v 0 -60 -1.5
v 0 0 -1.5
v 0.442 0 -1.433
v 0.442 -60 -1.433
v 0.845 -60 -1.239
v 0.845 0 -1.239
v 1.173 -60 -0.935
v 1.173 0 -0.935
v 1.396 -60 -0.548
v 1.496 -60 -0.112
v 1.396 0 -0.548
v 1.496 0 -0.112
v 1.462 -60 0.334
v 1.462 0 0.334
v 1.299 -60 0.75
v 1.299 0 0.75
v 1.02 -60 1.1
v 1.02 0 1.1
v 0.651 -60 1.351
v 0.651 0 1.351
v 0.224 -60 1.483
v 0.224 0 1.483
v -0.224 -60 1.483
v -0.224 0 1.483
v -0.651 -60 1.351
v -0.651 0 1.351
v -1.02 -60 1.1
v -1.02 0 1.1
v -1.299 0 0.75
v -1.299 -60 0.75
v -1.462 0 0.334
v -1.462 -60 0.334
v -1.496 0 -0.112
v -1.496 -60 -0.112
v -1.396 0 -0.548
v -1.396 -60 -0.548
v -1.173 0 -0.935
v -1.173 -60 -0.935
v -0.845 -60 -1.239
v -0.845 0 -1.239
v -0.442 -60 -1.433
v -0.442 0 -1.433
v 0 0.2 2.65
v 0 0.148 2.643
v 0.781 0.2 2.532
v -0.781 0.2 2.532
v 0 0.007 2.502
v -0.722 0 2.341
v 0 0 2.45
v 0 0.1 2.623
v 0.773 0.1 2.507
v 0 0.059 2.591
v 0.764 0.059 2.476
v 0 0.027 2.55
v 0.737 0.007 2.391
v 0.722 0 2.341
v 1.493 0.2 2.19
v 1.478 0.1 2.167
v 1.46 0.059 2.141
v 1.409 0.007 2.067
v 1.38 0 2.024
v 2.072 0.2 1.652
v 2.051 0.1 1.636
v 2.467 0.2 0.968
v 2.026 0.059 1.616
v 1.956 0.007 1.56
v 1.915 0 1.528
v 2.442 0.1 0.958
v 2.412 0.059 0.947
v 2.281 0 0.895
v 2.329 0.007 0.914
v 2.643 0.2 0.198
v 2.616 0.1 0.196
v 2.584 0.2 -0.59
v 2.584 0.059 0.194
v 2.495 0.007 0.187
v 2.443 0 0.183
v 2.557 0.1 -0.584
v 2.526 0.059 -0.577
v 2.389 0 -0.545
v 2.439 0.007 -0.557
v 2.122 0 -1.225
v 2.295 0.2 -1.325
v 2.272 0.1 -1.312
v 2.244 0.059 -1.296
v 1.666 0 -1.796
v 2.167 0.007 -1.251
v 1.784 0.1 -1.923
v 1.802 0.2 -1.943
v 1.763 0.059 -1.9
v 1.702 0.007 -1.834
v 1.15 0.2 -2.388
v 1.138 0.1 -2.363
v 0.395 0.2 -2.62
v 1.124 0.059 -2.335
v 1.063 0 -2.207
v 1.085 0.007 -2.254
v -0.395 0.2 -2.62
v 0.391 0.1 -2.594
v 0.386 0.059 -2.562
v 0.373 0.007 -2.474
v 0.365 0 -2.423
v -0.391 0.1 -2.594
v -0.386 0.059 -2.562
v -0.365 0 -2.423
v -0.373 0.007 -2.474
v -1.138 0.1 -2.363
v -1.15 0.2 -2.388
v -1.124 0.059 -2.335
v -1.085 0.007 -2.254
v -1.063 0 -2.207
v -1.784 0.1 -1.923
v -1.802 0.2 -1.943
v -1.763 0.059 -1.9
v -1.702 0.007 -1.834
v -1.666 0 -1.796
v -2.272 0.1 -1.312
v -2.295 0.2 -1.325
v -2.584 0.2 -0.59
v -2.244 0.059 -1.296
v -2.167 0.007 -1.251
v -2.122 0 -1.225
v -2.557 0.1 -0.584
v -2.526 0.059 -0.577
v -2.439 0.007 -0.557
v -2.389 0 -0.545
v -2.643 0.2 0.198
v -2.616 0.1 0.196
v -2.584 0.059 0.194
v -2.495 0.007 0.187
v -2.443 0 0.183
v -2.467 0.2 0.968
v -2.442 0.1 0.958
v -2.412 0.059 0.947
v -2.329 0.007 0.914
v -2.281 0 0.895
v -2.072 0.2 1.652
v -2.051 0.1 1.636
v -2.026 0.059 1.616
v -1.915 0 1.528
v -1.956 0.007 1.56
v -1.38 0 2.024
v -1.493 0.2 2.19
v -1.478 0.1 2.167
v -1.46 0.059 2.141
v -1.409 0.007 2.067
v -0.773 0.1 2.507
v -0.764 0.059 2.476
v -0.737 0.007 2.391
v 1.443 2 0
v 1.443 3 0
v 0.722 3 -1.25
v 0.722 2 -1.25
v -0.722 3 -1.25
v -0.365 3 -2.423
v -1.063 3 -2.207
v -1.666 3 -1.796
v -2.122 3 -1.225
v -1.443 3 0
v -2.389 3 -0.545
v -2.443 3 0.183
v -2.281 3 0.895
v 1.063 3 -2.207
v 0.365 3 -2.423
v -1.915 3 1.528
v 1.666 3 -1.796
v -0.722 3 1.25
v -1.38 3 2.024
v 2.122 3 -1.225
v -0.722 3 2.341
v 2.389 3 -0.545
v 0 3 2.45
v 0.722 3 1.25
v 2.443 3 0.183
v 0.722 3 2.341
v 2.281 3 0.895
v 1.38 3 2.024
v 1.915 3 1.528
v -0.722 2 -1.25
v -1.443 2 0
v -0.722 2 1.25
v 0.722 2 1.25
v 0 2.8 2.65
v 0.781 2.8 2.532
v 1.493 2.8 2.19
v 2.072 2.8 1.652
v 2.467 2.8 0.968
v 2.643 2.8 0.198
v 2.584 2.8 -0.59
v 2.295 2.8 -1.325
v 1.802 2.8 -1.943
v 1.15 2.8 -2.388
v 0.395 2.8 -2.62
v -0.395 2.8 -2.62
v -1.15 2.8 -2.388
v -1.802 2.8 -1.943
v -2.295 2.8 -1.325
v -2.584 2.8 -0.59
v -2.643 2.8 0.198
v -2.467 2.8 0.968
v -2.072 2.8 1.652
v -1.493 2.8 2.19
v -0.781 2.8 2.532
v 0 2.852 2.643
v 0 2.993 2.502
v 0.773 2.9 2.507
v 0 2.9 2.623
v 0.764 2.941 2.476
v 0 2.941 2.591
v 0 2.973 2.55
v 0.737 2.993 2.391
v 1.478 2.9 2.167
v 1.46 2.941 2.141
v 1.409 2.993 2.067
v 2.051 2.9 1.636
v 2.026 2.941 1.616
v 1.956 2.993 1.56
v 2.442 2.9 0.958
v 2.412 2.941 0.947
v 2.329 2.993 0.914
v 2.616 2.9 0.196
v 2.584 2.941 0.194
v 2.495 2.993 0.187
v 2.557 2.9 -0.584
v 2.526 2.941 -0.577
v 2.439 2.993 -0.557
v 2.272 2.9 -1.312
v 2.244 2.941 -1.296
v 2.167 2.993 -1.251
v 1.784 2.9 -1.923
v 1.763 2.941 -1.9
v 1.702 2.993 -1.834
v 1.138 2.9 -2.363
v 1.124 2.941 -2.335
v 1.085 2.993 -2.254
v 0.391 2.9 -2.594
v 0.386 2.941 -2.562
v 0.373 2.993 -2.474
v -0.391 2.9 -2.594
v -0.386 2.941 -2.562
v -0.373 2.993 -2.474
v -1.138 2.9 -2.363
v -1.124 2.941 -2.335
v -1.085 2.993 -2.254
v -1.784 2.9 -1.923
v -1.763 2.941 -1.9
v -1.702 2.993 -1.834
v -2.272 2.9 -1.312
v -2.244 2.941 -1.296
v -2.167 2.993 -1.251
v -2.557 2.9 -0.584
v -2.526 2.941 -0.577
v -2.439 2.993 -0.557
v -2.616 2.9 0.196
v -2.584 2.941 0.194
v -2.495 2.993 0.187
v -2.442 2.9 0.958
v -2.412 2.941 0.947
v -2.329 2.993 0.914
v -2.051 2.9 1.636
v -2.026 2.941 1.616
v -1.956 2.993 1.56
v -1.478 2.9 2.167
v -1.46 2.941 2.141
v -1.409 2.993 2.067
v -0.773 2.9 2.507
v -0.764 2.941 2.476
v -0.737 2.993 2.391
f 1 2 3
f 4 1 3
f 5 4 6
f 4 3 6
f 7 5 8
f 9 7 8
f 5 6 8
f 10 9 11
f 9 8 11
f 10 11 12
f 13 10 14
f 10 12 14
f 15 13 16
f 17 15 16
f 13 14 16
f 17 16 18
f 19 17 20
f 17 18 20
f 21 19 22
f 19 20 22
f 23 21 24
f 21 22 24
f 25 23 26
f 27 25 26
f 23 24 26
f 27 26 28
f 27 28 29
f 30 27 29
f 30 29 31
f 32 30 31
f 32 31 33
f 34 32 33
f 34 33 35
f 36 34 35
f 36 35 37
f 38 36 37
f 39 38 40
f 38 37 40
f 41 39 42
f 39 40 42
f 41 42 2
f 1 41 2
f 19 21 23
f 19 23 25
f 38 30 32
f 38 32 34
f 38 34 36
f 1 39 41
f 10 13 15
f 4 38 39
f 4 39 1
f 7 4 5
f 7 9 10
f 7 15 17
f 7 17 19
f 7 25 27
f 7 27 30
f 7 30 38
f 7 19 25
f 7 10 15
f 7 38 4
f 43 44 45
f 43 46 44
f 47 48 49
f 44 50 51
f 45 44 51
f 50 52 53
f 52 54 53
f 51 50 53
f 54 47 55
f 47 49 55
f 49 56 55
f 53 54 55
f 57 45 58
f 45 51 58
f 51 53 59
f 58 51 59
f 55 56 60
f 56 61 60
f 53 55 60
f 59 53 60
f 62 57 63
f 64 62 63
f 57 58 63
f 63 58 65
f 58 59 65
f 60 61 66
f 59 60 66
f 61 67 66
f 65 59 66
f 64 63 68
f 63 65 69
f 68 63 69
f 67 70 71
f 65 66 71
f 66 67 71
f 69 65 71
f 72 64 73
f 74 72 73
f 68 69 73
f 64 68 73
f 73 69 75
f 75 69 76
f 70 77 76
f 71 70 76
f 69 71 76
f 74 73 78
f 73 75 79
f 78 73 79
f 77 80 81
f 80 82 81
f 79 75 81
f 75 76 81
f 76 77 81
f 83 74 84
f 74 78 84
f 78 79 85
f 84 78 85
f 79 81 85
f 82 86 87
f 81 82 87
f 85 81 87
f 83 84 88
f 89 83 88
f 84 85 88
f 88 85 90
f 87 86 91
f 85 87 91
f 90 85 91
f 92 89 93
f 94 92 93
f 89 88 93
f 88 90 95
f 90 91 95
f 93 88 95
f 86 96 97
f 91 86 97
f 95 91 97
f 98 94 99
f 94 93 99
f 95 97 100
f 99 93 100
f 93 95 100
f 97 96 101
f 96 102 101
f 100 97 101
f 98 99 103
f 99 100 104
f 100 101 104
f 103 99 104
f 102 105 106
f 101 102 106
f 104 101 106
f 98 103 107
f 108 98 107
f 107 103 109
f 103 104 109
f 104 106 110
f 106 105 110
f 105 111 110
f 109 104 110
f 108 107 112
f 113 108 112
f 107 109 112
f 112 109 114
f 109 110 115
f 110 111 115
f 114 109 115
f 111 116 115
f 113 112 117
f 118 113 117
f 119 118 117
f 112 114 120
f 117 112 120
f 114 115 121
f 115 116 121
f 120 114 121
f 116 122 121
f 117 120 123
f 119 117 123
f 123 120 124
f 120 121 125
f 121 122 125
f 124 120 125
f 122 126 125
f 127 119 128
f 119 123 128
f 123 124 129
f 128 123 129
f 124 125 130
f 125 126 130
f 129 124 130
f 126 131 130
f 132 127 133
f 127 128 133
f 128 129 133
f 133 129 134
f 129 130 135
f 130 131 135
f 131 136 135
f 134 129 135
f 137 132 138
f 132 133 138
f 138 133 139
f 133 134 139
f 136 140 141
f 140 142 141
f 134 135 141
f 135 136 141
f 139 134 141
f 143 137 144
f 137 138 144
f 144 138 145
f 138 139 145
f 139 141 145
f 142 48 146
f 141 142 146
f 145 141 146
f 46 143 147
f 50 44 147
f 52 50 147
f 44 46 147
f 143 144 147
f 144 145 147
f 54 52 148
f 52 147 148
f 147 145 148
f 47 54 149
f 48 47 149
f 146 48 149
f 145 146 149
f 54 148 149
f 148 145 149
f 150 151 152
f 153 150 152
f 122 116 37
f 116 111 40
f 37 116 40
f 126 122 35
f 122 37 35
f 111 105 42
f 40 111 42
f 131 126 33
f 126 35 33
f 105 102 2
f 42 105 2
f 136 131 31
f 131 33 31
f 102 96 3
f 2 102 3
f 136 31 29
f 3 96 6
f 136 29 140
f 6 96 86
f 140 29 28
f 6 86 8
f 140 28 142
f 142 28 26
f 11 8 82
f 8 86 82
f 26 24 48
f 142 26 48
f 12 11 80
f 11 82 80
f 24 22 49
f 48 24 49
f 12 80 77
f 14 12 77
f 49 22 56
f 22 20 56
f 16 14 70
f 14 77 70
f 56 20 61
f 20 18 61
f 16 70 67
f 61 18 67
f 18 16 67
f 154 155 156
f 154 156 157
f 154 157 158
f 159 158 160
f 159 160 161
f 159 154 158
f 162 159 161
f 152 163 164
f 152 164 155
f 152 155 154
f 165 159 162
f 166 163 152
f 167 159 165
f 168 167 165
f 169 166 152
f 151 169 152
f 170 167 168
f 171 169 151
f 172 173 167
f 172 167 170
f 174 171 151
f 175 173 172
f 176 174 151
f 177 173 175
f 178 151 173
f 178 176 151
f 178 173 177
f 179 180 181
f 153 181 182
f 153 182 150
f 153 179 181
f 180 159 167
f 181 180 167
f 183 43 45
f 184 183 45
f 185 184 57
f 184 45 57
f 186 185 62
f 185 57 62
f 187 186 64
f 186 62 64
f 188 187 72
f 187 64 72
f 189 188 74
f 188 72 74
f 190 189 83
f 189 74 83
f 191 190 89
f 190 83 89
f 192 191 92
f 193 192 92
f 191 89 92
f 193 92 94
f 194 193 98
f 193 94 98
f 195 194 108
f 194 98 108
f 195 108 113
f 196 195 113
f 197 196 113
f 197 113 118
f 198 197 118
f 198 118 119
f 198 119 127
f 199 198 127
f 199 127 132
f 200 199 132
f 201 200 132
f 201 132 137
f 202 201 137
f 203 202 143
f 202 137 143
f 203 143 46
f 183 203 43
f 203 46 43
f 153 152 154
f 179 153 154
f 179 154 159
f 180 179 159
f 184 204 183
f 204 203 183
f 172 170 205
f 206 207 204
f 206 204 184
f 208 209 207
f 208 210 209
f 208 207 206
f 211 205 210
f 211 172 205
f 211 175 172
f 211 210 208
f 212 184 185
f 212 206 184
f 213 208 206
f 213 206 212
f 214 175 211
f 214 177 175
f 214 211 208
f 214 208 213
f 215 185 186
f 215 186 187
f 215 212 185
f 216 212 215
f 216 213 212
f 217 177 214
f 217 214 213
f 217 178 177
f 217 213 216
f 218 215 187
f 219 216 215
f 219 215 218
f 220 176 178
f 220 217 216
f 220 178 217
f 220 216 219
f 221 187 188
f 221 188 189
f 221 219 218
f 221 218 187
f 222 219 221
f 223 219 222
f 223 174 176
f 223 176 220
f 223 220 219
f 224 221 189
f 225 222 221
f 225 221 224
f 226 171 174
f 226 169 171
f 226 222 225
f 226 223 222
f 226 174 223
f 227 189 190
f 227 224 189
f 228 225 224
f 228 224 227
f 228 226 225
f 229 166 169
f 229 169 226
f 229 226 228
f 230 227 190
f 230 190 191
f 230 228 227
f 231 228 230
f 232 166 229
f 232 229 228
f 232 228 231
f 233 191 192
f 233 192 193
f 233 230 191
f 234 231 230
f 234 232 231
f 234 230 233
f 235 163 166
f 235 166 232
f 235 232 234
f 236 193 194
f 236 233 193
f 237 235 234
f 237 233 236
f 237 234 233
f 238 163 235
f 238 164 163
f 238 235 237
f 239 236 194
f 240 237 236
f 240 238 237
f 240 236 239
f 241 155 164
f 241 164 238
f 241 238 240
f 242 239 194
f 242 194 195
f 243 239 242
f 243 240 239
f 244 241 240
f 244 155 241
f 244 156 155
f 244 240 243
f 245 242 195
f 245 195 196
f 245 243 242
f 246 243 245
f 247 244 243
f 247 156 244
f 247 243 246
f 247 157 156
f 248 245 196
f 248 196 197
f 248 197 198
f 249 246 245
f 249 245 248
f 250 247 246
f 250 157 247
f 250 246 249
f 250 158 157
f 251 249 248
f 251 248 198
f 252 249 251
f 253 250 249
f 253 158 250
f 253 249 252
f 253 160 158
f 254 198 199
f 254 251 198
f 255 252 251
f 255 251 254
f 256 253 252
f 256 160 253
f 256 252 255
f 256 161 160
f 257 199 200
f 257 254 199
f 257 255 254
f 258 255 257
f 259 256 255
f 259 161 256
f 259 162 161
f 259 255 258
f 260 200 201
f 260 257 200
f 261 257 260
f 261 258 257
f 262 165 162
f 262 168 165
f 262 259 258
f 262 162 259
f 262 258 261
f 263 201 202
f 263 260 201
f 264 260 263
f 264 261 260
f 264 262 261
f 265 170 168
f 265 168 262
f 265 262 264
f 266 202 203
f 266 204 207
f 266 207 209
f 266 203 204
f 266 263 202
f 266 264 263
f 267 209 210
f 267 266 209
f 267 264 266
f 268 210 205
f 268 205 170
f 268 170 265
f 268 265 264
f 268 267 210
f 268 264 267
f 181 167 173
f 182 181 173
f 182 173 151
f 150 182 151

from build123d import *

# Parameters (mm, degrees)
SKETCH1_R           = 2.65
BOSS_EXTRUDE1_DEPTH = 3
CUT_EXTRUDE1_DEPTH  = 1
SKETCH3_R           = 1.5
BOSS_EXTRUDE2_DEPTH = 60
FILLET1_R           = 0.2


with BuildPart() as part:
    # Sketch1 → Boss-Extrude1 (new body)
    with BuildSketch(Plane(origin=(0, 0, 0), x_dir=(1, 0, 0), z_dir=(0, 1, 0))):
        with Locations(Location((0, 0, 0), (0, 0, 270))):
            Circle(SKETCH1_R)
    extrude(amount=BOSS_EXTRUDE1_DEPTH)

    # Sketch2 → Cut-Extrude1 (cut)
    with BuildSketch(Plane(origin=(0, 3, 0), x_dir=(1, 0, 0), z_dir=(0, 1, 0))):
        Polygon((1.443375673, 0), (0.721687836, 1.25), (-0.721687836, 1.25), (-1.443375673, 0), (-0.721687836, -1.25), (0.721687836, -1.25), align=None)
    extrude(amount=-CUT_EXTRUDE1_DEPTH, mode=Mode.SUBTRACT)

    # Sketch3 → Boss-Extrude2 (add)
    with BuildSketch(Plane.XZ):
        with Locations(Location((0, 0, 0), (0, 0, 270))):
            Circle(SKETCH3_R)
    extrude(amount=BOSS_EXTRUDE2_DEPTH)

    # Fillet1
    fillet1_edges = [part.edges().sort_by_distance(p)[0] for p in [
        (0, 0, -2.65),
        (0, 3, -2.65),
    ]]
    fillet(fillet1_edges, radius=FILLET1_R)


solid = part.part
